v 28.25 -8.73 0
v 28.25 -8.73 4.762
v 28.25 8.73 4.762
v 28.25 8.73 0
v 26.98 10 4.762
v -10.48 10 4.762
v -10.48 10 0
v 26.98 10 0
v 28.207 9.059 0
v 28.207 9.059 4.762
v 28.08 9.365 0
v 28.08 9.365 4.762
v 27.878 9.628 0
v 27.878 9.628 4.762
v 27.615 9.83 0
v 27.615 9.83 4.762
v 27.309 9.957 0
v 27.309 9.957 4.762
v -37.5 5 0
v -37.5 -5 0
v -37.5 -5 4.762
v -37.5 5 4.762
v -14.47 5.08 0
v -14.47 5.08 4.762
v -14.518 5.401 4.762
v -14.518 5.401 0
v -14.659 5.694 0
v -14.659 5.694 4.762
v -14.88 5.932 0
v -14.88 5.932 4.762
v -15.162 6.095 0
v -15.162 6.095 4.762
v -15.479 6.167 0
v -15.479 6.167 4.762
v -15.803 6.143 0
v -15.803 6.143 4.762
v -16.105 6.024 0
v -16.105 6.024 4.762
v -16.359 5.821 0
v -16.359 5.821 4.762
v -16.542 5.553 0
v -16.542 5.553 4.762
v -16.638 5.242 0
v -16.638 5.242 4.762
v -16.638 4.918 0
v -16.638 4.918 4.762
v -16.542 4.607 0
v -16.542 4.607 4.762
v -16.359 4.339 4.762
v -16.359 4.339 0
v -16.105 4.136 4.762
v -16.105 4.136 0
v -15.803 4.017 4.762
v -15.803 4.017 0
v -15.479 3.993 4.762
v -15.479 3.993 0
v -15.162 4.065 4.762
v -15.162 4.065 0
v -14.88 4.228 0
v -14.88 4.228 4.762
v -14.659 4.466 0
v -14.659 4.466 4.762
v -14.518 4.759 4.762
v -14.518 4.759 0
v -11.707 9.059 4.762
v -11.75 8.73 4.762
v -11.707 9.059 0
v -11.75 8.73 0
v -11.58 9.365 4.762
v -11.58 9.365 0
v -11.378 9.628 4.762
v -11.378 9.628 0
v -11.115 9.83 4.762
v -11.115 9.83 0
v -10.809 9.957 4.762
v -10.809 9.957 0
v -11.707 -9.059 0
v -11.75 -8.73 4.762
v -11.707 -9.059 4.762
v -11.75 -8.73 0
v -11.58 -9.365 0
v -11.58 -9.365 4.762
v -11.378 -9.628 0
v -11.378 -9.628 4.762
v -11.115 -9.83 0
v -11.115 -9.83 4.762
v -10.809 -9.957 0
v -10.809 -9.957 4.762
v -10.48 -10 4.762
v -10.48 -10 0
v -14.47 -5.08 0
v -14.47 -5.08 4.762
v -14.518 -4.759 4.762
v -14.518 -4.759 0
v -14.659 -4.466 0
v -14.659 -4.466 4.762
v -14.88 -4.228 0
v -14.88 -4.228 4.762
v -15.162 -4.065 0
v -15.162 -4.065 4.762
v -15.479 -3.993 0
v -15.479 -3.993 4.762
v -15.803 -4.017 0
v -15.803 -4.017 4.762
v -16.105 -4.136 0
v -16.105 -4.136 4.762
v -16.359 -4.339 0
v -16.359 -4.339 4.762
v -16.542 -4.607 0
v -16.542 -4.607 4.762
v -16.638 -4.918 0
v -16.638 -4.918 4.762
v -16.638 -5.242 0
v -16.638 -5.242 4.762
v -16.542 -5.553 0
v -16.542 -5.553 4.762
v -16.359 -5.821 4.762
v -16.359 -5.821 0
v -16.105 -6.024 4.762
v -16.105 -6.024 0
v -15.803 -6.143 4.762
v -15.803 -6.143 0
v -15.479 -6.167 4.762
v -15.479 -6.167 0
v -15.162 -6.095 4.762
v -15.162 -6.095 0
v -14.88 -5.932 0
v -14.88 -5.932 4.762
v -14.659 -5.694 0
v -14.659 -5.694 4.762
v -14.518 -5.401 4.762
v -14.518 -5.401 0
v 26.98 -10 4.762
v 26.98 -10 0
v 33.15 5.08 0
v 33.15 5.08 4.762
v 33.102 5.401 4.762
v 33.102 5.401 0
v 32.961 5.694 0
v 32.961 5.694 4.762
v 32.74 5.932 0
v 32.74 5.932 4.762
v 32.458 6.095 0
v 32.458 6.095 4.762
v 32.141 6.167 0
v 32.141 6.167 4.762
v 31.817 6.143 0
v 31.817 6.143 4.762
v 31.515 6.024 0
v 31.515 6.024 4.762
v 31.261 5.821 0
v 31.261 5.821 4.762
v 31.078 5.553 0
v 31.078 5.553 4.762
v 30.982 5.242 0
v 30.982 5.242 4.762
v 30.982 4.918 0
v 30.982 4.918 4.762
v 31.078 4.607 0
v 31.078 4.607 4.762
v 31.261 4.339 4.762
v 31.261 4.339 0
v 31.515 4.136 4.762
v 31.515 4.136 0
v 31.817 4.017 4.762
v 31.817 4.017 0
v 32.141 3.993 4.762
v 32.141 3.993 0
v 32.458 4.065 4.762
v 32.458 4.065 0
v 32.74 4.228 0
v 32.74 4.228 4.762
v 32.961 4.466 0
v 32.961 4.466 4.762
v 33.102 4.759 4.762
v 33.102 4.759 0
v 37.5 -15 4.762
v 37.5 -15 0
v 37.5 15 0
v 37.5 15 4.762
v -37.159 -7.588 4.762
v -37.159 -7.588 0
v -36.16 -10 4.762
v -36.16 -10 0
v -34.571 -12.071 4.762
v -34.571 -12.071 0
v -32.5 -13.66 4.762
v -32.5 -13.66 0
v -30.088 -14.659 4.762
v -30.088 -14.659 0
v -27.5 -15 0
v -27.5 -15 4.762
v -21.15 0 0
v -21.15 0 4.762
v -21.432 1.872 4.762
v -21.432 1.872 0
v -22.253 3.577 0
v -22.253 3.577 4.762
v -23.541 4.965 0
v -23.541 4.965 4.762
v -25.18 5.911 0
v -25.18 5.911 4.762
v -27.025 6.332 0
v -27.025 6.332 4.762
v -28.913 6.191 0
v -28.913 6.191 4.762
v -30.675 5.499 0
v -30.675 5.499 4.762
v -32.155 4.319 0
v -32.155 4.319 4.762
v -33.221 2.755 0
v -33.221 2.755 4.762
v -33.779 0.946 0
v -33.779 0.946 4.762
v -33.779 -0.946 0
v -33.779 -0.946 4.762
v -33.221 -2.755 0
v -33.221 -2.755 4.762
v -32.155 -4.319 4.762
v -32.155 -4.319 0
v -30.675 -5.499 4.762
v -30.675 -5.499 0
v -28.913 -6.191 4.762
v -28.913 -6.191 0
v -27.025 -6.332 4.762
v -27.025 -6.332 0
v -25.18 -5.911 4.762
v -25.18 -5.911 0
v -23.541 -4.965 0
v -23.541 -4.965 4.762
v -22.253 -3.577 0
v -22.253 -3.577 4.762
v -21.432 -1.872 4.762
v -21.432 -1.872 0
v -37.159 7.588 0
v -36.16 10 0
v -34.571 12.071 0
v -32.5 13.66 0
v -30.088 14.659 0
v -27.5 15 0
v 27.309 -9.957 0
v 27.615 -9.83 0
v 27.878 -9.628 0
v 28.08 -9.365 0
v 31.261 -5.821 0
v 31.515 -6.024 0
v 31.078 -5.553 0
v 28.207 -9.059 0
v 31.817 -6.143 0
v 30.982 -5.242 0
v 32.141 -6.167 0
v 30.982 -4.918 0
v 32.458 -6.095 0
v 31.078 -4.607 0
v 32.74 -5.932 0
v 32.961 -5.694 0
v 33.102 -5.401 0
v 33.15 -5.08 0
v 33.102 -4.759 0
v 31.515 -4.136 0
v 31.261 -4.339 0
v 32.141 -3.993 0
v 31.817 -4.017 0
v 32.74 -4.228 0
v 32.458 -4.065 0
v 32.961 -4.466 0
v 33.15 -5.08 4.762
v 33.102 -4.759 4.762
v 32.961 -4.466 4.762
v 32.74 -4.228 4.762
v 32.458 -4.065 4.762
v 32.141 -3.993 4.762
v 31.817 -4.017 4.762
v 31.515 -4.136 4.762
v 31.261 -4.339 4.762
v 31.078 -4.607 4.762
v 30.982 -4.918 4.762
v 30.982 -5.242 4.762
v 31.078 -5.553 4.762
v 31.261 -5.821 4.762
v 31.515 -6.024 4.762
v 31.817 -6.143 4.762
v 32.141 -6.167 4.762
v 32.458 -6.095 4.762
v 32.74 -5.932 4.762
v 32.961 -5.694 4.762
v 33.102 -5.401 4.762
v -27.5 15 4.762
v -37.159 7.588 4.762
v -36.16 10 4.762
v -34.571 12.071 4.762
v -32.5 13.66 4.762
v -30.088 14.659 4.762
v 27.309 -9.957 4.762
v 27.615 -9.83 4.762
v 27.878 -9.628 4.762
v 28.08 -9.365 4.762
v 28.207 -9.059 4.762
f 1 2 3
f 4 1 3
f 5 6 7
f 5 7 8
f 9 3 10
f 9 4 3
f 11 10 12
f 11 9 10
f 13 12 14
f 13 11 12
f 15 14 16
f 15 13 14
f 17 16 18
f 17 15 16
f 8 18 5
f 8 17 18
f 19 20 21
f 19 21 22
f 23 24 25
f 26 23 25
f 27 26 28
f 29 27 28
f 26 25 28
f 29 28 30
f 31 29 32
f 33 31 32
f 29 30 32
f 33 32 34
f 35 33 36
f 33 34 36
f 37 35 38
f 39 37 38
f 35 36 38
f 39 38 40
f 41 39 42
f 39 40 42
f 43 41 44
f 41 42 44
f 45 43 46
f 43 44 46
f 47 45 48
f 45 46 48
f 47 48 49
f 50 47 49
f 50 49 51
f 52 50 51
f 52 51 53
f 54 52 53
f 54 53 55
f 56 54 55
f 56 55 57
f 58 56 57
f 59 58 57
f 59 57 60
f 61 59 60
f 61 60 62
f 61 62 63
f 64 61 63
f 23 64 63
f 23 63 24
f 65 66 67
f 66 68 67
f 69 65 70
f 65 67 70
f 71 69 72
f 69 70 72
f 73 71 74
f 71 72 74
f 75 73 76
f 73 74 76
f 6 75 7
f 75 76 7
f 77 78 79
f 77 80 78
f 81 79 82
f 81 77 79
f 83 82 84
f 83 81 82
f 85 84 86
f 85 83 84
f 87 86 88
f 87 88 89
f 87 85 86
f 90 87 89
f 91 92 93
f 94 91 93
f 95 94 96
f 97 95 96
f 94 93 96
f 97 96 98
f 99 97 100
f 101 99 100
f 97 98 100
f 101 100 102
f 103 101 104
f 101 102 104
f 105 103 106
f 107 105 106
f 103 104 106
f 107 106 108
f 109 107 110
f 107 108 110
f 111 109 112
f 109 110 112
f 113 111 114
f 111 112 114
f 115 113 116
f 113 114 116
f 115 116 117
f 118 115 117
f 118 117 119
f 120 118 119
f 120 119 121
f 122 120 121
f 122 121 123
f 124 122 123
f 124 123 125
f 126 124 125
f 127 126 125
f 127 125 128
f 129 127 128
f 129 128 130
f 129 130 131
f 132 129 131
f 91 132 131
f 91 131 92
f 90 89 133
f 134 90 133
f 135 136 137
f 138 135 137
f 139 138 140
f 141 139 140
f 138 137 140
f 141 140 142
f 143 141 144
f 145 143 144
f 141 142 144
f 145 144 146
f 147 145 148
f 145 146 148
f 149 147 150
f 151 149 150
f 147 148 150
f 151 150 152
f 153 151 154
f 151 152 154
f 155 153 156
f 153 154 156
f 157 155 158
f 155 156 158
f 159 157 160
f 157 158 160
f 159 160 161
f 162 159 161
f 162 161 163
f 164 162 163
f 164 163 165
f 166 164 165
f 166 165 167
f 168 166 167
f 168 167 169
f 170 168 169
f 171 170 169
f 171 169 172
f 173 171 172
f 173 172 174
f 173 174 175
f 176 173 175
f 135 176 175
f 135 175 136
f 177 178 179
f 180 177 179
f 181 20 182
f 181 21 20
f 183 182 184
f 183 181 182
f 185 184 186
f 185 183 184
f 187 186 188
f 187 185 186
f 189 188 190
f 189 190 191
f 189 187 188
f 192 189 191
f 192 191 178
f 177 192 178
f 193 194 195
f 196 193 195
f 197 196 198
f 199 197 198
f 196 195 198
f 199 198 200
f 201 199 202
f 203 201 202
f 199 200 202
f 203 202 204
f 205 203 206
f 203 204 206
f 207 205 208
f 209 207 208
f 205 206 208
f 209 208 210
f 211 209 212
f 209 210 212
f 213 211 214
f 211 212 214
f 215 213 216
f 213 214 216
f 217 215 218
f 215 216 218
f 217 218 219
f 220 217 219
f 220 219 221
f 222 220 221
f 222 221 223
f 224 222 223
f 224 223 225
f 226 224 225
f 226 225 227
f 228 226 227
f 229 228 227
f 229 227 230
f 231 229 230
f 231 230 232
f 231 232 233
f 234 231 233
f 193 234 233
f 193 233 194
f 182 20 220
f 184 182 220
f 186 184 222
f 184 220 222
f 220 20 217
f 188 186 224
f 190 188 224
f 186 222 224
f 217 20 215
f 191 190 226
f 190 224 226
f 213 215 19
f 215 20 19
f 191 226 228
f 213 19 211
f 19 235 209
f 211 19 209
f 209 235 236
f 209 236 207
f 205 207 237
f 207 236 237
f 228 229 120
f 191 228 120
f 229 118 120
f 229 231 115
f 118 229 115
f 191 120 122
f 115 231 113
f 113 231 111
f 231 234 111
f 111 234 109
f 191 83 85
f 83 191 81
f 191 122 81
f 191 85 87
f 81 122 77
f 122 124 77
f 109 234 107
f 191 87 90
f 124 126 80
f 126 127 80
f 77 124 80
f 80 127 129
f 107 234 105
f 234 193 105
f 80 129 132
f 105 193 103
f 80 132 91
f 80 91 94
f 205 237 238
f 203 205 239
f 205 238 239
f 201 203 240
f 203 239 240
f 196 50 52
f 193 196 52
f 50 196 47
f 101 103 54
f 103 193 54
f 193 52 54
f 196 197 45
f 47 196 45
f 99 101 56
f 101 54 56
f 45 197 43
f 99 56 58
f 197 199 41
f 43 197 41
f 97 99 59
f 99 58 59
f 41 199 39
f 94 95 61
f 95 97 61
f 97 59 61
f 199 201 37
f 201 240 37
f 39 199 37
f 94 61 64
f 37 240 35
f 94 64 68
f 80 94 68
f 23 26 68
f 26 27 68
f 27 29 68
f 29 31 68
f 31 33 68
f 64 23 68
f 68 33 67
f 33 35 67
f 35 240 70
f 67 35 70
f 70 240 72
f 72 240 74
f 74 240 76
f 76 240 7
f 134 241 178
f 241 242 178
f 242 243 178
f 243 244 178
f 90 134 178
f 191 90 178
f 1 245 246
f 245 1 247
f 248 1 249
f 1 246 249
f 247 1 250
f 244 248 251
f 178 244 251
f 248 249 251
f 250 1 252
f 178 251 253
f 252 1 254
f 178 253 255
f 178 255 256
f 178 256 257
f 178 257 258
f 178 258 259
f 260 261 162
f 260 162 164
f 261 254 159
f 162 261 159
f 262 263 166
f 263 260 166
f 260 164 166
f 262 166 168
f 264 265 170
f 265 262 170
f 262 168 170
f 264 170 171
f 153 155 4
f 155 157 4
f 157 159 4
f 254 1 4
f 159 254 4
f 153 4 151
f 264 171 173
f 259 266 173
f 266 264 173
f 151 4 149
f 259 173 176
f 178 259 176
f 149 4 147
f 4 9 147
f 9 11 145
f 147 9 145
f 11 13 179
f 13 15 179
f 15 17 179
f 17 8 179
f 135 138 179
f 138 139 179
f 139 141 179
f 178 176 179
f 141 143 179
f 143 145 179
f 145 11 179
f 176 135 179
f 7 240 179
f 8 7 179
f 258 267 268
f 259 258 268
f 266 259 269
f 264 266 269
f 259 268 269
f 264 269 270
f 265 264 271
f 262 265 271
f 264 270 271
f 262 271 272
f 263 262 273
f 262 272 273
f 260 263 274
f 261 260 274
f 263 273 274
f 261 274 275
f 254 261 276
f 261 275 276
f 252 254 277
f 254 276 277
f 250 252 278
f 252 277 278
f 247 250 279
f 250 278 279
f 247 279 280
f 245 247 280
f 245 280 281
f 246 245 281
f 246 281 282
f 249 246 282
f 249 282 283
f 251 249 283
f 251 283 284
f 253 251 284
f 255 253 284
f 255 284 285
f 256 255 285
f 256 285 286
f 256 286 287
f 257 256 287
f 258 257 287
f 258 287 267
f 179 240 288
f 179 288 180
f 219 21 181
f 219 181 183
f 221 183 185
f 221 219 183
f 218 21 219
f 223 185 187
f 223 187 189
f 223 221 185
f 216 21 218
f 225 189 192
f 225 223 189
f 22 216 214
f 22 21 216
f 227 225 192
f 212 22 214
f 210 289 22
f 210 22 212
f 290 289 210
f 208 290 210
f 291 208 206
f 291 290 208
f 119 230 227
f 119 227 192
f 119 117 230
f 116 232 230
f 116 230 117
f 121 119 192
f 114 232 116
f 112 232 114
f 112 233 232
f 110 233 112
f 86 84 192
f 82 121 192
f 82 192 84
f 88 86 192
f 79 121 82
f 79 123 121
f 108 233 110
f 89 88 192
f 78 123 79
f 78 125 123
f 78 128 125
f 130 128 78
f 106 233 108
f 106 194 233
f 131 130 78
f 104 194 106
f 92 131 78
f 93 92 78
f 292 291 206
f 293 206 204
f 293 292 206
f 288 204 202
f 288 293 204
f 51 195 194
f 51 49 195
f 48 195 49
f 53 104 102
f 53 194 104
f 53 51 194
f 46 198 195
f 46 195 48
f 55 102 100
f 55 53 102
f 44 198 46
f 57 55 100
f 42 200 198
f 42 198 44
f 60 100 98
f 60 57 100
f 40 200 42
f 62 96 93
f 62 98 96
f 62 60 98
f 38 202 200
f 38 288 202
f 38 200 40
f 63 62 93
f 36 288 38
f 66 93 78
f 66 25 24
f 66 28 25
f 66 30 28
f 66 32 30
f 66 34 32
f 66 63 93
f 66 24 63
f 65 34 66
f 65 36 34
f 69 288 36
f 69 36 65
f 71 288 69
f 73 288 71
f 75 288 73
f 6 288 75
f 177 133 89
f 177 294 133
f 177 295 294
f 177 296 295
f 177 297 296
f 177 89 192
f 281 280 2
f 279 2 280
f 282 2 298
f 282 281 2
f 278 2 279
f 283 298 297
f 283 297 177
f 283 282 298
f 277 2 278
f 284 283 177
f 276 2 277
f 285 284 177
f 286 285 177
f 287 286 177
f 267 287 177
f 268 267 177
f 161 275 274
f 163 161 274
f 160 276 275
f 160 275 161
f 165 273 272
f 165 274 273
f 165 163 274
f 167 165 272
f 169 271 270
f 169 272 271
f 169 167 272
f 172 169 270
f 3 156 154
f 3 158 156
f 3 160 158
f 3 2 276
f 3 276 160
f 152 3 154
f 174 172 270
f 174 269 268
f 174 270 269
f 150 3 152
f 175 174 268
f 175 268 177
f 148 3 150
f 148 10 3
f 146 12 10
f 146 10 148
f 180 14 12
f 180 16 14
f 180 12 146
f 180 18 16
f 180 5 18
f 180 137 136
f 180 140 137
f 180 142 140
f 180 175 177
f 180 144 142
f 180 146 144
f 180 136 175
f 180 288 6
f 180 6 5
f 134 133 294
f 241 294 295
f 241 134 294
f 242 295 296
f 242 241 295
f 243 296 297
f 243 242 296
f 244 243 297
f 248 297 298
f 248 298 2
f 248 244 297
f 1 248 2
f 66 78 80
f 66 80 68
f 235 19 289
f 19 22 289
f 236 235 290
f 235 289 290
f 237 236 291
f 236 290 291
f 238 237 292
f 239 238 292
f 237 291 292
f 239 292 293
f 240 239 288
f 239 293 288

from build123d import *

# Parameters (mm, degrees)
ESQUISSE1_W             = 75
ESQUISSE1_H             = 30
BOSS_EXTRU_1_DEPTH      = 4.7625
CONG_1_R                = 10
ESQUISSE2_R             = 6.35
ENL_V_MAT_EXTRU_1_DEPTH = 6
ENL_V_MAT_EXTRU_2_REACH = 42.669
ESQUISSE3_W             = 40
ESQUISSE3_H             = 20
CONG_2_R                = 1.27
ENL_V_MAT_EXTRU_3_REACH = 42.669
ESQUISSE4_R             = 1.09


with BuildPart() as part:
    # Esquisse1 → Boss.-Extru.1 (new body)
    with BuildSketch(Plane.XY):
        Rectangle(ESQUISSE1_W, ESQUISSE1_H)
    extrude(amount=BOSS_EXTRU_1_DEPTH)

    # Congé1
    cong_1_edges = [part.edges().sort_by_distance(p)[0] for p in [
        (-37.5, -15, 2.38125),
        (-37.5, 15, 2.38125),
    ]]
    fillet(cong_1_edges, radius=CONG_1_R)

    # Esquisse2 → Enlèv. mat.-Extru.1 (cut)
    with BuildSketch(Plane.XY.offset(4.7625)):
        with Locations((-27.5, 0)):
            Circle(ESQUISSE2_R)
    extrude(amount=-ENL_V_MAT_EXTRU_1_DEPTH, mode=Mode.SUBTRACT)

    # Esquisse3 → Enlèv. mat.-Extru.2 (cut, up to next)
    with BuildSketch(Plane.XY.offset(4.7625), mode=Mode.PRIVATE) as enl_v_mat_extru_2_sk1:
        with Locations((8.25, 0)):
            Rectangle(ESQUISSE3_W, ESQUISSE3_H)
    enl_v_mat_extru_2_tool1 = extrude(enl_v_mat_extru_2_sk1.sketch, amount=-ENL_V_MAT_EXTRU_2_REACH, mode=Mode.PRIVATE) & part.part
    add(enl_v_mat_extru_2_tool1.solids().sort_by_distance((8.25, 0, 4.7625))[0], mode=Mode.SUBTRACT)

    # Congé2
    cong_2_edges = [part.edges().sort_by_distance(p)[0] for p in [
        (-11.75, -10, 2.38125),
        (-11.75, 10, 2.38125),
        (28.25, 10, 2.38125),
        (28.25, -10, 2.38125),
    ]]
    fillet(cong_2_edges, radius=CONG_2_R)

    # Esquisse4 → Enlèv. mat.-Extru.3 (cut, up to next)
    with BuildSketch(Plane.XY.offset(4.7625), mode=Mode.PRIVATE) as enl_v_mat_extru_3_sk1:
        with Locations((-15.56, 5.08)):
            Circle(ESQUISSE4_R)
    enl_v_mat_extru_3_tool1 = extrude(enl_v_mat_extru_3_sk1.sketch, amount=-ENL_V_MAT_EXTRU_3_REACH, mode=Mode.PRIVATE) & part.part
    # Esquisse4 → Enlèv. mat.-Extru.3 (cut, up to next)
    with BuildSketch(Plane.XY.offset(4.7625), mode=Mode.PRIVATE) as enl_v_mat_extru_3_sk2:
        with Locations((-15.56, -5.08)):
            Circle(ESQUISSE4_R)
    enl_v_mat_extru_3_tool2 = extrude(enl_v_mat_extru_3_sk2.sketch, amount=-ENL_V_MAT_EXTRU_3_REACH, mode=Mode.PRIVATE) & part.part
    # Esquisse4 → Enlèv. mat.-Extru.3 (cut, up to next)
    with BuildSketch(Plane.XY.offset(4.7625), mode=Mode.PRIVATE) as enl_v_mat_extru_3_sk3:
        with Locations((32.06, -5.08)):
            Circle(ESQUISSE4_R)
    enl_v_mat_extru_3_tool3 = extrude(enl_v_mat_extru_3_sk3.sketch, amount=-ENL_V_MAT_EXTRU_3_REACH, mode=Mode.PRIVATE) & part.part
    # Esquisse4 → Enlèv. mat.-Extru.3 (cut, up to next)
    with BuildSketch(Plane.XY.offset(4.7625), mode=Mode.PRIVATE) as enl_v_mat_extru_3_sk4:
        with Locations((32.06, 5.08)):
            Circle(ESQUISSE4_R)
    enl_v_mat_extru_3_tool4 = extrude(enl_v_mat_extru_3_sk4.sketch, amount=-ENL_V_MAT_EXTRU_3_REACH, mode=Mode.PRIVATE) & part.part
    add(enl_v_mat_extru_3_tool1.solids().sort_by_distance((-15.56, 5.08, 4.7625))[0], mode=Mode.SUBTRACT)
    add(enl_v_mat_extru_3_tool2.solids().sort_by_distance((-15.56, -5.08, 4.7625))[0], mode=Mode.SUBTRACT)
    add(enl_v_mat_extru_3_tool3.solids().sort_by_distance((32.06, -5.08, 4.7625))[0], mode=Mode.SUBTRACT)
    add(enl_v_mat_extru_3_tool4.solids().sort_by_distance((32.06, 5.08, 4.7625))[0], mode=Mode.SUBTRACT)


solid = part.part
